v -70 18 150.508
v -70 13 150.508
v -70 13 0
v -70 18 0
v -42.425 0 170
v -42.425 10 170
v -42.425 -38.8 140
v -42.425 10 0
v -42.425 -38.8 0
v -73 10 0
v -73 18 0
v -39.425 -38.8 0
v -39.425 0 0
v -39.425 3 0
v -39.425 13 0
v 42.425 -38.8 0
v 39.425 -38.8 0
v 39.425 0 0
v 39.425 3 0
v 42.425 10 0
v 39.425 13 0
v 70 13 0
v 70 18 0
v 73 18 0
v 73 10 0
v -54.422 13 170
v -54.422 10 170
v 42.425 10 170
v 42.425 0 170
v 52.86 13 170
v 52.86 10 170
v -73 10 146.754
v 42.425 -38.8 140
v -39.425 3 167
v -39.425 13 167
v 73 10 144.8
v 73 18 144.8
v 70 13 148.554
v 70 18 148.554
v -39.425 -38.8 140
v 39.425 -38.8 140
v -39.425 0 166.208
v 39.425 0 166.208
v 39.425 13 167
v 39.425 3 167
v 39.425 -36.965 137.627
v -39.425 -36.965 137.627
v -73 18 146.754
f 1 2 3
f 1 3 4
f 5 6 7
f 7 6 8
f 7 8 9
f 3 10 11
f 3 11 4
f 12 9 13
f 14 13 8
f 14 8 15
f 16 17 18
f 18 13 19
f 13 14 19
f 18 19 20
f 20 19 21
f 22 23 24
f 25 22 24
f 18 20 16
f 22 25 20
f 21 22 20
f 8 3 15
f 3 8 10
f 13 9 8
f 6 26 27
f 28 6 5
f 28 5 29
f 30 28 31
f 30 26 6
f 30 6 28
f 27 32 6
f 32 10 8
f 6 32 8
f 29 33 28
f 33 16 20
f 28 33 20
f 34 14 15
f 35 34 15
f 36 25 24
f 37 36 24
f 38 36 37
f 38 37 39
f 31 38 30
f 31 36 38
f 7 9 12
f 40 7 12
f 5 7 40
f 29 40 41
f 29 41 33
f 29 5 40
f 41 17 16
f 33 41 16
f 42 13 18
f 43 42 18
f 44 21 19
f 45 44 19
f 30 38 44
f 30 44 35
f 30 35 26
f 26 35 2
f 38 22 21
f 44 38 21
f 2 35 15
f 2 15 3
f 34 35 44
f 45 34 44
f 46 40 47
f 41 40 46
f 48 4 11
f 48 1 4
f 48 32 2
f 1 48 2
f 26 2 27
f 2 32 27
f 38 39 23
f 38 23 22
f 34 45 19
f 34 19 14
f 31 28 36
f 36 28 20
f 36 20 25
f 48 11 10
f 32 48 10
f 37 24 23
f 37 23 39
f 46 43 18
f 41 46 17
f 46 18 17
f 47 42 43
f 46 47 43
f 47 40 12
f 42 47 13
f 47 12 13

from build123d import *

# Parameters (mm, degrees)
Y_KSEKLIK_EKSTR_ZYON2_DEPTH = 170
KES_EKSTR_ZYON1_DEPTH       = 190.035552212
KES_EKSTR_ZYON1_DEPTH_BACK  = 190.035552212
IZIM3_W                     = 78.85
IZIM3_H                     = 49.045285197
Y_KSEKLIK_EKSTR_ZYON3_DEPTH = 3
KES_EKSTR_ZYON3_DEPTH       = 190.035552212
KES_EKSTR_ZYON3_DEPTH_BACK  = 190.035552212
IZIM5_W                     = 84.85
IZIM5_H                     = 13
Y_KSEKLIK_EKSTR_ZYON4_DEPTH = 3


with BuildPart() as part:
    # Çizim1 → Yükseklik-Ekstrüzyon2 (new body)
    with BuildSketch(Plane.XY):
        Polygon((-39.425, 0), (39.425, 0), (39.425, -38.8), (42.425, -38.8), (42.425, 10), (73, 10), (73, 18), (70, 18), (70, 13), (39.425, 13), (39.425, 3), (-39.425, 3), (-39.425, 13), (-70, 13), (-70, 18), (-73, 18), (-73, 10), (-42.425, 10), (-42.425, -38.8), (-39.425, -38.8), align=None)
    extrude(amount=Y_KSEKLIK_EKSTR_ZYON2_DEPTH)

    # Çizim2 → Kes-Ekstrüzyon1 (cut, two sides: drawn at the far end of the back side and taken through both)
    with BuildSketch(Plane(origin=(0, 0, 0), x_dir=(0, 0, -1), z_dir=(1, 0, 0)).offset(-KES_EKSTR_ZYON1_DEPTH_BACK)):
        Polygon((-170, -38.8), (-170, 0), (-140, -38.8), align=None)
    extrude(amount=KES_EKSTR_ZYON1_DEPTH + KES_EKSTR_ZYON1_DEPTH_BACK, mode=Mode.SUBTRACT)

    # Çizim3 → Yükseklik-Ekstrüzyon3 (add)
    with BuildSketch(Plane(origin=(0, -82.263535985, 106.394173207), x_dir=(1, 0, 0), z_dir=(0, -0.6116795912153945, 0.7911056046385767))):
        with Locations((0, 79.462887909)):
            Rectangle(IZIM3_W, IZIM3_H)
    extrude(amount=-Y_KSEKLIK_EKSTR_ZYON3_DEPTH)

    # Çizim4 → Kes-Ekstrüzyon3 (cut, two sides: drawn at the far end of the back side and taken through both)
    with BuildSketch(Plane(origin=(0, 0, 0), x_dir=(1, 0, 0), z_dir=(0, 1, 0)).offset(-KES_EKSTR_ZYON3_DEPTH_BACK)):
        Polygon((-73, -170), (-73, -146.754135669), (-54.421757633, -170), align=None)
        Polygon((52.86, -170), (73, -170), (73, -144.8), align=None)
    extrude(amount=KES_EKSTR_ZYON3_DEPTH + KES_EKSTR_ZYON3_DEPTH_BACK, mode=Mode.SUBTRACT)

    # Çizim5 → Yükseklik-Ekstrüzyon4 (add)
    with BuildSketch(Plane.XY.offset(170)):
        with Locations((0, 6.5)):
            Rectangle(IZIM5_W, IZIM5_H)
    extrude(amount=-Y_KSEKLIK_EKSTR_ZYON4_DEPTH)


solid = part.part
